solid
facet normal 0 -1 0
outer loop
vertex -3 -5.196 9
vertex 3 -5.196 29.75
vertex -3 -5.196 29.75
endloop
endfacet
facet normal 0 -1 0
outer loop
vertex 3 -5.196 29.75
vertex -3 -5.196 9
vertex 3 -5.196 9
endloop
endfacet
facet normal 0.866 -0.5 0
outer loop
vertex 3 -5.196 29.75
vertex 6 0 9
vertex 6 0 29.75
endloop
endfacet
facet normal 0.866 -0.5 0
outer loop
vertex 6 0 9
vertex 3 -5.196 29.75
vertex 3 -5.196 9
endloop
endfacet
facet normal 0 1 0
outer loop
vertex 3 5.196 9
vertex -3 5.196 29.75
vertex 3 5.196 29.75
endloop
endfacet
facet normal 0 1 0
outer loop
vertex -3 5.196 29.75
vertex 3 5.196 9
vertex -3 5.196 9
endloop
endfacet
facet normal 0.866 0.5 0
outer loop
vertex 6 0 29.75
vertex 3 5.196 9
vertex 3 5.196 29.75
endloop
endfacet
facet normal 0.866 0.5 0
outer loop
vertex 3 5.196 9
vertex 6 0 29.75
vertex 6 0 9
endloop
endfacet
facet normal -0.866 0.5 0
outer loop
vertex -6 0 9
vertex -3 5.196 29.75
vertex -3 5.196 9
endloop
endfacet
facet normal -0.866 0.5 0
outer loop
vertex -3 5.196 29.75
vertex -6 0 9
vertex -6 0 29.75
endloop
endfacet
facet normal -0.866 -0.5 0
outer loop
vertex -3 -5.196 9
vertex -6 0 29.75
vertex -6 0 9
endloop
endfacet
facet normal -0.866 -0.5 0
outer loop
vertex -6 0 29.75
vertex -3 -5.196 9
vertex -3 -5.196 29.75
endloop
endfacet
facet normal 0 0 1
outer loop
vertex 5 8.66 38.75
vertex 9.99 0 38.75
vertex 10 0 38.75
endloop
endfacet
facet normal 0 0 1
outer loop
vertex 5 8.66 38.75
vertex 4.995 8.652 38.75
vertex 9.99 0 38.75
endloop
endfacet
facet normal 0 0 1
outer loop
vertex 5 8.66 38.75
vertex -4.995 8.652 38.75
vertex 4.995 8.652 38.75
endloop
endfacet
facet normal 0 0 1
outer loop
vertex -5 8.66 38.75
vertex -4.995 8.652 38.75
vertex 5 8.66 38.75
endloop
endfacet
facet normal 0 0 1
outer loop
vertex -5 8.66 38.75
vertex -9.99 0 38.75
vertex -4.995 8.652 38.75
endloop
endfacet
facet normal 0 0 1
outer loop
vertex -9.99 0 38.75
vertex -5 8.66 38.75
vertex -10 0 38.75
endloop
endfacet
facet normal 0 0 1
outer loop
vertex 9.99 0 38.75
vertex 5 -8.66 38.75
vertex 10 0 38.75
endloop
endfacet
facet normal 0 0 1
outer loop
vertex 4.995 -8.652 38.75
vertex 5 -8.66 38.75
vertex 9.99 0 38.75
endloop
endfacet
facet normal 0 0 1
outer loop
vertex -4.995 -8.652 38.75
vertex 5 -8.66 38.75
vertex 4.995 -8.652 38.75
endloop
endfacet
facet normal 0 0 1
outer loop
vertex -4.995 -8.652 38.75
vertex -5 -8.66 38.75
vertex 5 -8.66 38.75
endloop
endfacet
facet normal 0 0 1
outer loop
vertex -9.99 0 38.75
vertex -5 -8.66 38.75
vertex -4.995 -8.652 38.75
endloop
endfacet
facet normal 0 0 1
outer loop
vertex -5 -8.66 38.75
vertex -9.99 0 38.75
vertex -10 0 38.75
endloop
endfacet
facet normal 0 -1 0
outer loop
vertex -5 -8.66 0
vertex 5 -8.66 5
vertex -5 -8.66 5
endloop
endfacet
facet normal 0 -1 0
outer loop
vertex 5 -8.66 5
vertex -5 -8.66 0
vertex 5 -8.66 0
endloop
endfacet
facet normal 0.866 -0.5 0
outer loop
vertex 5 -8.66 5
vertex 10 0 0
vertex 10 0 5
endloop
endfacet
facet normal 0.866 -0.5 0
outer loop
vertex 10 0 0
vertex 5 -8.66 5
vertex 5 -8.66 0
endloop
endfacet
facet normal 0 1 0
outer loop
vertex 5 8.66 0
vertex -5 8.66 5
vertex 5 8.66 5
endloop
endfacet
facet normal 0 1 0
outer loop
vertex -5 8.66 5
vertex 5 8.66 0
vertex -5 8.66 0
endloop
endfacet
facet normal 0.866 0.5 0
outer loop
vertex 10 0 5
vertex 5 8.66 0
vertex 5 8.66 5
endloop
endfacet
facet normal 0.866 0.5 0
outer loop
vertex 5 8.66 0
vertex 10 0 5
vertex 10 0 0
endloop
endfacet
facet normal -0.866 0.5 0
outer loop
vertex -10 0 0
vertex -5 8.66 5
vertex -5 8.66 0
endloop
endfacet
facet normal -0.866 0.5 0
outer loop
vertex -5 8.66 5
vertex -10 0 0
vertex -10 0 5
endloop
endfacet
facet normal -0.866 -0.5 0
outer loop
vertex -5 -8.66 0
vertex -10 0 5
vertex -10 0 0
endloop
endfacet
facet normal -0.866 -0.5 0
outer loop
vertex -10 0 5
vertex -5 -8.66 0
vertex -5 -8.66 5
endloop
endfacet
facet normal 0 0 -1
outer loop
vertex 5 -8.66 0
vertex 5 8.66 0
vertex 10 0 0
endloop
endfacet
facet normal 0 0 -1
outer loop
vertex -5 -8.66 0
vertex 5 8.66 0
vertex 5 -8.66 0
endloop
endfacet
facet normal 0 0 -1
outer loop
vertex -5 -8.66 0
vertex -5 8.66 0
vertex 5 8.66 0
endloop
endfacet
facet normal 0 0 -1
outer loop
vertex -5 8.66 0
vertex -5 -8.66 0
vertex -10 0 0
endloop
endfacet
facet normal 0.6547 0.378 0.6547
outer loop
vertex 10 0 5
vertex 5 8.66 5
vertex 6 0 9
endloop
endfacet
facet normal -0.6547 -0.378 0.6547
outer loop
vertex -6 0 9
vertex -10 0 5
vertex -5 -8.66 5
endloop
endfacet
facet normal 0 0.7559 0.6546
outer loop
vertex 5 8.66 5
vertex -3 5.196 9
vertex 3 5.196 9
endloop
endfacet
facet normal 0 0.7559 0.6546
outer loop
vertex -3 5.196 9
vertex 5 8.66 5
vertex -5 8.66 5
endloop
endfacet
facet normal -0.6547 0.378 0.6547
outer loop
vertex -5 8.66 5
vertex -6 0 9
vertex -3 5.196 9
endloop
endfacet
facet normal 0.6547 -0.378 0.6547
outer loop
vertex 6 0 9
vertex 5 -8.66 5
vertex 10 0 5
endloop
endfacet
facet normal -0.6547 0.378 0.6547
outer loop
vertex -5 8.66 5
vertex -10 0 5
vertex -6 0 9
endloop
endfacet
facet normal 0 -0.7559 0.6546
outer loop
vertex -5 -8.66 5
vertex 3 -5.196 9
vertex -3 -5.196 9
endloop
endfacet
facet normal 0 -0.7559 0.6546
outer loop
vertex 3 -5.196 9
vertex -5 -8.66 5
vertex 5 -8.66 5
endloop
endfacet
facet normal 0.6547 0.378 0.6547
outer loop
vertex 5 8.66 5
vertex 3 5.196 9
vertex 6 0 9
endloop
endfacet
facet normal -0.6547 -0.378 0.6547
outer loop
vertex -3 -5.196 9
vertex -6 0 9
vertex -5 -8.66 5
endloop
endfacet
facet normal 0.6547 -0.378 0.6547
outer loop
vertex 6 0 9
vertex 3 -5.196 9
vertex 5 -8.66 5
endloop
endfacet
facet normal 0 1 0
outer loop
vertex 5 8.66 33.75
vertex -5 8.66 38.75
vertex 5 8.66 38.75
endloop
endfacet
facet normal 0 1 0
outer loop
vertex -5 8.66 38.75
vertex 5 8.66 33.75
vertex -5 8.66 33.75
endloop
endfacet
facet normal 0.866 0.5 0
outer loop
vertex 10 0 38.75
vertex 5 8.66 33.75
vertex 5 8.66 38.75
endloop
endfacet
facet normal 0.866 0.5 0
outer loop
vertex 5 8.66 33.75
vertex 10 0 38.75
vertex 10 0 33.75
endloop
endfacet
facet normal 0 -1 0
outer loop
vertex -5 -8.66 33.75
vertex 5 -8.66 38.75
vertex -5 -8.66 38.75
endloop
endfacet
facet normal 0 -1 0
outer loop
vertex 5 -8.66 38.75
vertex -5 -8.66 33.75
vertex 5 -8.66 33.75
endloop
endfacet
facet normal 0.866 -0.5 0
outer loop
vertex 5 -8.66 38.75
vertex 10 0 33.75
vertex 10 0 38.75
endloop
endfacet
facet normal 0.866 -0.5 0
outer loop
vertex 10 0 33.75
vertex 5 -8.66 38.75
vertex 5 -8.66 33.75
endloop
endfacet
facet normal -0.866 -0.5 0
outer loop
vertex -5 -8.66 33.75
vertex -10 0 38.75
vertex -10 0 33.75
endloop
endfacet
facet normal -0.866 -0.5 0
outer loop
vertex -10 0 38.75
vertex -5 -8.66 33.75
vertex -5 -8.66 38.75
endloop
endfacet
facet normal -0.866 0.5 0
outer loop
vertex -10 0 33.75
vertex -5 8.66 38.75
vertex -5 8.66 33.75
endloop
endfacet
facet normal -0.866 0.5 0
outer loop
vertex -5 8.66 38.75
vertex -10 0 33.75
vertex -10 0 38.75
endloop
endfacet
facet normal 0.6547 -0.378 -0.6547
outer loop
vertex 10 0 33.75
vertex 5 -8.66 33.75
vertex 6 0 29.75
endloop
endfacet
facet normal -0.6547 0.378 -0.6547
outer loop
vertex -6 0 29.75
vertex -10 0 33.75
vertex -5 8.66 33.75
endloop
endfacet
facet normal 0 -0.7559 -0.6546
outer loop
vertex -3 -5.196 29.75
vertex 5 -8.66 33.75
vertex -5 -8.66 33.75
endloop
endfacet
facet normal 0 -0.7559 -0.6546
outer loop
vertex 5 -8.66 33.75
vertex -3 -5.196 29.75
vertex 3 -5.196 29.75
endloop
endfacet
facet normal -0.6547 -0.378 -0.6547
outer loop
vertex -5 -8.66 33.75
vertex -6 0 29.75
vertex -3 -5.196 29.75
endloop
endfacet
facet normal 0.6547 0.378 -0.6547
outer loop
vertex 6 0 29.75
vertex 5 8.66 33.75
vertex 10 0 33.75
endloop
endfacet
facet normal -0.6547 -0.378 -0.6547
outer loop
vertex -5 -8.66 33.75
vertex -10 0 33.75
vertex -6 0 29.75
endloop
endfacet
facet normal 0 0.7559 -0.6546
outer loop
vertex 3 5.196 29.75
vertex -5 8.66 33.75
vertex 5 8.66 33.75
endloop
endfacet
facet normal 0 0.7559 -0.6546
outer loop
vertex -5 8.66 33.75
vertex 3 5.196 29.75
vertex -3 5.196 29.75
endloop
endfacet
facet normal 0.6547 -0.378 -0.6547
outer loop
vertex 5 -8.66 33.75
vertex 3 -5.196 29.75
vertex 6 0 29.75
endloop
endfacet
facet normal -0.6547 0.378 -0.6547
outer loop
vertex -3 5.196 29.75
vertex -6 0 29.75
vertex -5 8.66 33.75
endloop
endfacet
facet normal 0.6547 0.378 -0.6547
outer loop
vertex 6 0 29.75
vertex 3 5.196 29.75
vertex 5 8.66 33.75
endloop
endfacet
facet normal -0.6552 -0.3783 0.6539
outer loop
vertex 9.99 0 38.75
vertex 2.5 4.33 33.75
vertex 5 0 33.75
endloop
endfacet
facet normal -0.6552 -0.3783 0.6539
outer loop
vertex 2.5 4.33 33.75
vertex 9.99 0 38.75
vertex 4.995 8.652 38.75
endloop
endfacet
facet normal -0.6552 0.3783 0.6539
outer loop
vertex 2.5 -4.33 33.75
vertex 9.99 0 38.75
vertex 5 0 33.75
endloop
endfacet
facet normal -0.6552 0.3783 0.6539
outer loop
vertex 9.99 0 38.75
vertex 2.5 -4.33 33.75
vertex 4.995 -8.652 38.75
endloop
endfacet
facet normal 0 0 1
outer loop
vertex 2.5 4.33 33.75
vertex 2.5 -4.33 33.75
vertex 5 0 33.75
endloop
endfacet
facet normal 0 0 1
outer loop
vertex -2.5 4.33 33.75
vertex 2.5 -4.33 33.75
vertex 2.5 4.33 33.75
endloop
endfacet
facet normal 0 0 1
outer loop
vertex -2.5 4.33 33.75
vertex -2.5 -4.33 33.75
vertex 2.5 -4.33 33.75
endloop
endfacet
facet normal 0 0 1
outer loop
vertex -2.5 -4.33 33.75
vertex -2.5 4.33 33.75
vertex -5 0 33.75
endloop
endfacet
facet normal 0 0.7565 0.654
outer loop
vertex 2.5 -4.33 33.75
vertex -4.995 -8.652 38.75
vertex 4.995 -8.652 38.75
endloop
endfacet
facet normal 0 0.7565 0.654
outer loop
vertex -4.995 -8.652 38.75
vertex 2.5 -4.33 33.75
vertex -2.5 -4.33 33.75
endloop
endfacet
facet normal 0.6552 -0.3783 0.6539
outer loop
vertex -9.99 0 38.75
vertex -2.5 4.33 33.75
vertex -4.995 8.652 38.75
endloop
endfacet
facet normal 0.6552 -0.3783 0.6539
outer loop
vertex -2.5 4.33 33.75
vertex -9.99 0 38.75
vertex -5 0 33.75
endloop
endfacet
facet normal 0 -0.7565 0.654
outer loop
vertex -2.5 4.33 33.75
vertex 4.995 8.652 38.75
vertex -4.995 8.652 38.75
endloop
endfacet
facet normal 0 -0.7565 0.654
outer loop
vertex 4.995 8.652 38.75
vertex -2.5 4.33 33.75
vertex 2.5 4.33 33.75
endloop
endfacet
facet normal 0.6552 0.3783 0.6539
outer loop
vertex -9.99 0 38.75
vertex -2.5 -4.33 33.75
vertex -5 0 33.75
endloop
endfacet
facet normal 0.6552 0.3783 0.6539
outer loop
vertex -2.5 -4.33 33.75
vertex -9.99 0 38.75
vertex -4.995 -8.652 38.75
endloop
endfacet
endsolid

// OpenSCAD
// file: piece_base.scad
include <config.scad>;

module piece_base(height,top_diam){
	union(){
		translate([0,0,base_height+(base_diam-piece_diam)/2])
		cylinder(r1=piece_diam/2,r2=top_diam/2,h=height-base_height-(base_diam-piece_diam)/2);
		cylinder(r=base_diam/2,h=base_height);
		translate([0,0,base_height])
			cylinder(r1=base_diam/2,
						r2=piece_diam/2,
						h=(base_diam-piece_diam)/2);
	}
}

piece_base(pawn_height,piece_diam*0.6);
// file: config.scad
piece_diam = 12;
base_diam = 20;
base_height = 5;
pawn_height = 25;


$fn=6;
// main file
include <config.scad>;
use <piece_base.scad>;

tower_height = pawn_height*1.55;

module rook(){
	difference(){
		union(){
			piece_base(tower_height,piece_diam);
			translate([0,0,tower_height])
			rotate([180,0,0])
			piece_base(tower_height,piece_diam);
		}
		translate([0,0,tower_height-base_height])
			cylinder(r1=base_diam/4,r2=base_diam/2,h=base_height+0.01);
	}
}
rook();
